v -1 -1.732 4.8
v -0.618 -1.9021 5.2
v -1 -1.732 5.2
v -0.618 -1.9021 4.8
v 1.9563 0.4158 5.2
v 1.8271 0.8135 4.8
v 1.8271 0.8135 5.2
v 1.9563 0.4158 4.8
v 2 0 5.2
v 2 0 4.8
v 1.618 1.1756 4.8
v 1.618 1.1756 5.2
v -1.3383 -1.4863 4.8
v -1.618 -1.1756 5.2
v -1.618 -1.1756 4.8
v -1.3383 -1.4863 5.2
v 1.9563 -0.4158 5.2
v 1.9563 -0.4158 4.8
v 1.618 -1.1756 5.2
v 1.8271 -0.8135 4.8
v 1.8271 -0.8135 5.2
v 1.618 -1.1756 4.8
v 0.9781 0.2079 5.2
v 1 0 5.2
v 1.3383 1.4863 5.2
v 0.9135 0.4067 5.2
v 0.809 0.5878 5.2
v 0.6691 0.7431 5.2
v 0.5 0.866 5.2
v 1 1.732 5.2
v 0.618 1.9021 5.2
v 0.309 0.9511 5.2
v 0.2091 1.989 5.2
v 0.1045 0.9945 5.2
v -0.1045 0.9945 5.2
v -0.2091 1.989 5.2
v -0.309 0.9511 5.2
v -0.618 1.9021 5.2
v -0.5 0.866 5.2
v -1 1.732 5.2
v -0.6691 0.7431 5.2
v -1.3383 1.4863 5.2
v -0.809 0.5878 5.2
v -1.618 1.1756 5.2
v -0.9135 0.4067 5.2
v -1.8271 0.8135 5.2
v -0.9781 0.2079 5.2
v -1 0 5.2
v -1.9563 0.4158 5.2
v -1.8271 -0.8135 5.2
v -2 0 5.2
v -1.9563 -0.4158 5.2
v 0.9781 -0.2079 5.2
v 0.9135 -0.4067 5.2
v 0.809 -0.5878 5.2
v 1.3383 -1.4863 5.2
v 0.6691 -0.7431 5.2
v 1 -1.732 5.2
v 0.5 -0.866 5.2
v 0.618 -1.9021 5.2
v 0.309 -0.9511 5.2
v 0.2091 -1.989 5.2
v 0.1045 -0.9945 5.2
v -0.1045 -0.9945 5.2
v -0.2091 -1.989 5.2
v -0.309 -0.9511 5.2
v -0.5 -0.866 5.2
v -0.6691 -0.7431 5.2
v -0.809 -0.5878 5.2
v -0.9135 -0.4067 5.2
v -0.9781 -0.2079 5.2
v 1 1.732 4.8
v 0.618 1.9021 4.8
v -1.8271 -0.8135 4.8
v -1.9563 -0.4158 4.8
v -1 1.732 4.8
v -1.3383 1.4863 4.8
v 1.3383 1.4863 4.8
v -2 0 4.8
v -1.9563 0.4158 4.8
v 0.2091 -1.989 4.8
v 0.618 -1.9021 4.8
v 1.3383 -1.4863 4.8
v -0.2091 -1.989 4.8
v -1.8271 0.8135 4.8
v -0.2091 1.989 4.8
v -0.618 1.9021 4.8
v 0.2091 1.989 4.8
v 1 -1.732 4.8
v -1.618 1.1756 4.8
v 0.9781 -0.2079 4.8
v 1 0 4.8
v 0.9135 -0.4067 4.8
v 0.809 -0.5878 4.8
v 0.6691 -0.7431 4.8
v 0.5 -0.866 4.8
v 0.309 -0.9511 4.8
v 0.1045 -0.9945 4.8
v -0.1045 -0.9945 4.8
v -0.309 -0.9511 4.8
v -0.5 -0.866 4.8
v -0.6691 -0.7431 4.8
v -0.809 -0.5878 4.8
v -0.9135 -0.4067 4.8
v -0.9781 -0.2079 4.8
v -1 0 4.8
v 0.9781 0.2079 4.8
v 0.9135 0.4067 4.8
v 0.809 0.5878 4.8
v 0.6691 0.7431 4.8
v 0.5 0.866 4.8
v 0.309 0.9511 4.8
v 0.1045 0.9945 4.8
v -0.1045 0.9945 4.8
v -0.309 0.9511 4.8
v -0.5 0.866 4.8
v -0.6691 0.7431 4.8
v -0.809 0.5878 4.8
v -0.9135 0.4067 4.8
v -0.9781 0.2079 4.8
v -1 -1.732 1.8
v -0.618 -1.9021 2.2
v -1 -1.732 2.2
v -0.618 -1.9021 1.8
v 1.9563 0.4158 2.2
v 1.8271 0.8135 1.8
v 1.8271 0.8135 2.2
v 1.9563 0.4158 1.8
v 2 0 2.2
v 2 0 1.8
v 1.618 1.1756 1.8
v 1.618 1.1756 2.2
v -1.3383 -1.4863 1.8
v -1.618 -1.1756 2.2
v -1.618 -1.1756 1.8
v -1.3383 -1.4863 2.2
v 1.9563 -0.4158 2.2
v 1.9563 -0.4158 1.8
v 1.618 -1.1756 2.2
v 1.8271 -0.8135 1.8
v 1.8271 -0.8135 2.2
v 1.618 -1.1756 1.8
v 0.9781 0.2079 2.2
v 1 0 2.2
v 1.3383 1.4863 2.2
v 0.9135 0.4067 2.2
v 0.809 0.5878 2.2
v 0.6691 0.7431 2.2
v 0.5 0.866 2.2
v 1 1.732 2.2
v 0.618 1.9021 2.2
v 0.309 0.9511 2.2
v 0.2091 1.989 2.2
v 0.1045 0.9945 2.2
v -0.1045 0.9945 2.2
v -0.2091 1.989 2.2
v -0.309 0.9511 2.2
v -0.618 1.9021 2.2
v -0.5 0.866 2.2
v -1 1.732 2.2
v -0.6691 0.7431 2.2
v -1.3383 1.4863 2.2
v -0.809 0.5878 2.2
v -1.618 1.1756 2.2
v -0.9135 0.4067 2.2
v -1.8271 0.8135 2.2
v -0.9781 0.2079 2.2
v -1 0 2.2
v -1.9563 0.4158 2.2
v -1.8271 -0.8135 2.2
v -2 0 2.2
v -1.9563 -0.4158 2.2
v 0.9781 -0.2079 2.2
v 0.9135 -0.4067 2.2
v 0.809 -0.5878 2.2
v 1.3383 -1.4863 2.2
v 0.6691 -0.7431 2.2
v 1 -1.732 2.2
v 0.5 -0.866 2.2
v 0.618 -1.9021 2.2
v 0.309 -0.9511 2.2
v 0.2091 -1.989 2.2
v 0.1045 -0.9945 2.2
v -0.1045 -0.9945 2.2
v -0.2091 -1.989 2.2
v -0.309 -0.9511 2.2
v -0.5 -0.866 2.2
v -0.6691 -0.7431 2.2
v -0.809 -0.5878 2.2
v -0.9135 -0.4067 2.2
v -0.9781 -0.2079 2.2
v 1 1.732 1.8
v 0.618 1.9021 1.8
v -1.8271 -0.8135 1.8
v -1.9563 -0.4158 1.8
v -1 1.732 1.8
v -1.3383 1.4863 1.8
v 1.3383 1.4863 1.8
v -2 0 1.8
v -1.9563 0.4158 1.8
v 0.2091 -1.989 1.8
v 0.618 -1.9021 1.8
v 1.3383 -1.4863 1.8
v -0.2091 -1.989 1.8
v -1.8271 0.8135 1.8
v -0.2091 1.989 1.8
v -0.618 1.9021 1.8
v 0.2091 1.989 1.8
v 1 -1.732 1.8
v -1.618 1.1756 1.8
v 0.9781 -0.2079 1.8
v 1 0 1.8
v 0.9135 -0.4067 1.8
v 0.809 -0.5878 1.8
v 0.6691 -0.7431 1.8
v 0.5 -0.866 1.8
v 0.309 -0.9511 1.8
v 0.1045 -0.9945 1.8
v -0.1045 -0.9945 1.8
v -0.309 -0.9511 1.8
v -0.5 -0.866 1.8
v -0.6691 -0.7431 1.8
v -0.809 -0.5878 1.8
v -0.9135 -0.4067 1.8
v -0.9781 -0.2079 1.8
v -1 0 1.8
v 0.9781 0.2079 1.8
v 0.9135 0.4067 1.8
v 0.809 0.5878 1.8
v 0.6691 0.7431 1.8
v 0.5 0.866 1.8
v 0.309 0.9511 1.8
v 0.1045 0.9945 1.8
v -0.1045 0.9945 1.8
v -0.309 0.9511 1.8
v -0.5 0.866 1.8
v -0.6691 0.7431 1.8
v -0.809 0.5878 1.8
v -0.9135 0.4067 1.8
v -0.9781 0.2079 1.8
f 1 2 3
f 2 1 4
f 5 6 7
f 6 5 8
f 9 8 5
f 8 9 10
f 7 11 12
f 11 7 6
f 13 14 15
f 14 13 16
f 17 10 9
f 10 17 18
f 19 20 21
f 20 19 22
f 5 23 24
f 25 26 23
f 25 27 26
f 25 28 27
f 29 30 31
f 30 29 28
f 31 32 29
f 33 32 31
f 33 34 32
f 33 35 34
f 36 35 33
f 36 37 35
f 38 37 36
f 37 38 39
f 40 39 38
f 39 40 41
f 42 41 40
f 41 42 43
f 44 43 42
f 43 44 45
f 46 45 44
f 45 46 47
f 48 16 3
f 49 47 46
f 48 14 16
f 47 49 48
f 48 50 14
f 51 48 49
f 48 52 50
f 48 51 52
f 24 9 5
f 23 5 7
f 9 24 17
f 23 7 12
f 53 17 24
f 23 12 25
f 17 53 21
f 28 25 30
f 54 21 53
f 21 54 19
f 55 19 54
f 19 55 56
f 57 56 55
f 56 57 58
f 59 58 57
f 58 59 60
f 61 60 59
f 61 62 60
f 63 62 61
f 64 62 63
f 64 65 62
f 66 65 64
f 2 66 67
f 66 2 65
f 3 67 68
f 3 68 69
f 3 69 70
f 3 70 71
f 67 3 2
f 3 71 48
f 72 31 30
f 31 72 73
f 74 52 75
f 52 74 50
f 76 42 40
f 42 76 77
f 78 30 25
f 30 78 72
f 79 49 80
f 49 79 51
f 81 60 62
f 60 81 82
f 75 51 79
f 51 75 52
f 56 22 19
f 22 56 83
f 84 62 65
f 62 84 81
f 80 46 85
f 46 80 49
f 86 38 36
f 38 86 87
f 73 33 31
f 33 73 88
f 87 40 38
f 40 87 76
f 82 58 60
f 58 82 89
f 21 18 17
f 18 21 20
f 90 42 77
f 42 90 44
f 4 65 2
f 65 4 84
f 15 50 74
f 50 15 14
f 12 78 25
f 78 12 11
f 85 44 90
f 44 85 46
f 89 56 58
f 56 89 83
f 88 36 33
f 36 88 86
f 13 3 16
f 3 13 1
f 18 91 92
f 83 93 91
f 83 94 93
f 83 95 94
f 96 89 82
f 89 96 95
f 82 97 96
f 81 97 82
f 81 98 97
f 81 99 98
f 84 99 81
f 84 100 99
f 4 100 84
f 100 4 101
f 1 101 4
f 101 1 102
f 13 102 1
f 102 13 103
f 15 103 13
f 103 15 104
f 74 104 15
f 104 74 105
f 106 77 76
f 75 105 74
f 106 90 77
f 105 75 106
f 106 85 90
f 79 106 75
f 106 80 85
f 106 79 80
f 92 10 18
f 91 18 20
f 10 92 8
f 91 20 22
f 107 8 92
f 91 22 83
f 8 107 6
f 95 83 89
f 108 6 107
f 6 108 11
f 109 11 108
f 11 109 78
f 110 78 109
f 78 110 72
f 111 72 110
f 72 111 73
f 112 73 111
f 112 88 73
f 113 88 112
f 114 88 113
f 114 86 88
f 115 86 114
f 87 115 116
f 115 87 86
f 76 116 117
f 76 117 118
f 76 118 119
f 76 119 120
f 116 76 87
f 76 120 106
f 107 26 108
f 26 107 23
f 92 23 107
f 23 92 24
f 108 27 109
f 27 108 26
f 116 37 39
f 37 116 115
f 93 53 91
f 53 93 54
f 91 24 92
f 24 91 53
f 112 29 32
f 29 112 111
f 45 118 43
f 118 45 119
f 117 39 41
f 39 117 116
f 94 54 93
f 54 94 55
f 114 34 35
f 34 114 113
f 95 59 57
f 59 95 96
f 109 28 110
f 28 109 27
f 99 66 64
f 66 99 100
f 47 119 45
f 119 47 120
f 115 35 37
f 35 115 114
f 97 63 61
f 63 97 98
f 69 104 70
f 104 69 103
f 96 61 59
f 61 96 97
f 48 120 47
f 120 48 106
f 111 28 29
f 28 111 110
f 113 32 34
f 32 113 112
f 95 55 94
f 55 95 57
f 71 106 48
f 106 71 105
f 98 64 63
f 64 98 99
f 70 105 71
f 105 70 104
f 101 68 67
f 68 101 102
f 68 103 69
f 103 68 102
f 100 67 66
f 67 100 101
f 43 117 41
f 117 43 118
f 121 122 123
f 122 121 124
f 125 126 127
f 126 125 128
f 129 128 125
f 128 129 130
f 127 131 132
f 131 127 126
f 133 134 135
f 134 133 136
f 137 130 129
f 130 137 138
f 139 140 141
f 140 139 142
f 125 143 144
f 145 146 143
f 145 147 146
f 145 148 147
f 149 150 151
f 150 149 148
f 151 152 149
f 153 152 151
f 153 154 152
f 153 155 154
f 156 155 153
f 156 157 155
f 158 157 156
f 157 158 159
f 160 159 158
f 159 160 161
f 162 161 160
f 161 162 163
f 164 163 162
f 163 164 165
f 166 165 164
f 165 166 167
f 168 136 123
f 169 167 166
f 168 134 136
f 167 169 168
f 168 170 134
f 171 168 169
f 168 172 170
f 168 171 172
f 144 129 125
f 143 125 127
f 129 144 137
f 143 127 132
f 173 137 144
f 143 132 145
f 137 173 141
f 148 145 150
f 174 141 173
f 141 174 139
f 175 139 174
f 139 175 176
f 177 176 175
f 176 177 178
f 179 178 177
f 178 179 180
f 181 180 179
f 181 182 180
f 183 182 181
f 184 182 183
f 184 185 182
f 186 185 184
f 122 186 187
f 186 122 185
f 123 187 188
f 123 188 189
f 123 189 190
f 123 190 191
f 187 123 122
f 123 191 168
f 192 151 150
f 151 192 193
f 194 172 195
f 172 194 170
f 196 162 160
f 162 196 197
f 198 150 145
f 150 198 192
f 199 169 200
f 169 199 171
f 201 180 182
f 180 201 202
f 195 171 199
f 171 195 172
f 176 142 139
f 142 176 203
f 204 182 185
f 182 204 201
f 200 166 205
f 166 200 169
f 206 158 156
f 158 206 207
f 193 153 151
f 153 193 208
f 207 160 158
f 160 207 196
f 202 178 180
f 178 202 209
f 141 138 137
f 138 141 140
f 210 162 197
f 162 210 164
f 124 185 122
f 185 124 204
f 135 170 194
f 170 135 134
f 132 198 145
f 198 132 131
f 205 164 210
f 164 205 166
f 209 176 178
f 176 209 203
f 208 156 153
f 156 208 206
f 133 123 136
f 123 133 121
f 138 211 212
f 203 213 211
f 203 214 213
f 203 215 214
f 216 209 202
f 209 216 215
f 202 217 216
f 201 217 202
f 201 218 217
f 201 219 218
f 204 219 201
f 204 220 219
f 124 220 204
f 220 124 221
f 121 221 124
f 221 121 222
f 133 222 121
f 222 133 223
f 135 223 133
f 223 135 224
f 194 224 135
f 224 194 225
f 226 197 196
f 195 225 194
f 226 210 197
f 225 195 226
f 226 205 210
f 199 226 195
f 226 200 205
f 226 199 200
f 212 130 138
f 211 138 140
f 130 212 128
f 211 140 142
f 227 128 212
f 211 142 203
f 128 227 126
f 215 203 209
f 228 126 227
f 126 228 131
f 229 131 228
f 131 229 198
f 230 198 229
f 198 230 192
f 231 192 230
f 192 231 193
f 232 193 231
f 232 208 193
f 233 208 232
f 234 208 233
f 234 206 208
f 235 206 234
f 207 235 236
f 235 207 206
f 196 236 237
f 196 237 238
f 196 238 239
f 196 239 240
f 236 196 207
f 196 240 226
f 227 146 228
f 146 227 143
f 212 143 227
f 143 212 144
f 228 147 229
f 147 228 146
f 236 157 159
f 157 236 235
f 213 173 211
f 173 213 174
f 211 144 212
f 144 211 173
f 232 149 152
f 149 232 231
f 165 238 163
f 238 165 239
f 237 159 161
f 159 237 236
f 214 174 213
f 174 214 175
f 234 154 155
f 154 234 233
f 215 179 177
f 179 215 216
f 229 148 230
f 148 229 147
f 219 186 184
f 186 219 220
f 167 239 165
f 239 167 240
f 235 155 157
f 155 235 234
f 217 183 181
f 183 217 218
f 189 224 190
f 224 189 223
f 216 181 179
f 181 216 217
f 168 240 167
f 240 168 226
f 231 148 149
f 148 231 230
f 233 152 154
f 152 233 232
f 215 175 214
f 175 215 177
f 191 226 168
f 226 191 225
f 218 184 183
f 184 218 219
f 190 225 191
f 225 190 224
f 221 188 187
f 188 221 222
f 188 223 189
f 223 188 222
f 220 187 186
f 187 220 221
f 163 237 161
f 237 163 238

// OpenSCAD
// file: combinationRing.scad
module combinationRing(pos){
    translate(pos){
        difference() {

            $fs=0.1; //mm
            cylinder(d=4, h=0.4, center=true);
            cylinder(d=2, h=0.5, center=true);
        }
    }
}
// main file
include <combinationRing.scad>

module buildAll(){
    combinationRing([0,0,5]);
    combinationRing([0,0,2]);
}

buildAll();
